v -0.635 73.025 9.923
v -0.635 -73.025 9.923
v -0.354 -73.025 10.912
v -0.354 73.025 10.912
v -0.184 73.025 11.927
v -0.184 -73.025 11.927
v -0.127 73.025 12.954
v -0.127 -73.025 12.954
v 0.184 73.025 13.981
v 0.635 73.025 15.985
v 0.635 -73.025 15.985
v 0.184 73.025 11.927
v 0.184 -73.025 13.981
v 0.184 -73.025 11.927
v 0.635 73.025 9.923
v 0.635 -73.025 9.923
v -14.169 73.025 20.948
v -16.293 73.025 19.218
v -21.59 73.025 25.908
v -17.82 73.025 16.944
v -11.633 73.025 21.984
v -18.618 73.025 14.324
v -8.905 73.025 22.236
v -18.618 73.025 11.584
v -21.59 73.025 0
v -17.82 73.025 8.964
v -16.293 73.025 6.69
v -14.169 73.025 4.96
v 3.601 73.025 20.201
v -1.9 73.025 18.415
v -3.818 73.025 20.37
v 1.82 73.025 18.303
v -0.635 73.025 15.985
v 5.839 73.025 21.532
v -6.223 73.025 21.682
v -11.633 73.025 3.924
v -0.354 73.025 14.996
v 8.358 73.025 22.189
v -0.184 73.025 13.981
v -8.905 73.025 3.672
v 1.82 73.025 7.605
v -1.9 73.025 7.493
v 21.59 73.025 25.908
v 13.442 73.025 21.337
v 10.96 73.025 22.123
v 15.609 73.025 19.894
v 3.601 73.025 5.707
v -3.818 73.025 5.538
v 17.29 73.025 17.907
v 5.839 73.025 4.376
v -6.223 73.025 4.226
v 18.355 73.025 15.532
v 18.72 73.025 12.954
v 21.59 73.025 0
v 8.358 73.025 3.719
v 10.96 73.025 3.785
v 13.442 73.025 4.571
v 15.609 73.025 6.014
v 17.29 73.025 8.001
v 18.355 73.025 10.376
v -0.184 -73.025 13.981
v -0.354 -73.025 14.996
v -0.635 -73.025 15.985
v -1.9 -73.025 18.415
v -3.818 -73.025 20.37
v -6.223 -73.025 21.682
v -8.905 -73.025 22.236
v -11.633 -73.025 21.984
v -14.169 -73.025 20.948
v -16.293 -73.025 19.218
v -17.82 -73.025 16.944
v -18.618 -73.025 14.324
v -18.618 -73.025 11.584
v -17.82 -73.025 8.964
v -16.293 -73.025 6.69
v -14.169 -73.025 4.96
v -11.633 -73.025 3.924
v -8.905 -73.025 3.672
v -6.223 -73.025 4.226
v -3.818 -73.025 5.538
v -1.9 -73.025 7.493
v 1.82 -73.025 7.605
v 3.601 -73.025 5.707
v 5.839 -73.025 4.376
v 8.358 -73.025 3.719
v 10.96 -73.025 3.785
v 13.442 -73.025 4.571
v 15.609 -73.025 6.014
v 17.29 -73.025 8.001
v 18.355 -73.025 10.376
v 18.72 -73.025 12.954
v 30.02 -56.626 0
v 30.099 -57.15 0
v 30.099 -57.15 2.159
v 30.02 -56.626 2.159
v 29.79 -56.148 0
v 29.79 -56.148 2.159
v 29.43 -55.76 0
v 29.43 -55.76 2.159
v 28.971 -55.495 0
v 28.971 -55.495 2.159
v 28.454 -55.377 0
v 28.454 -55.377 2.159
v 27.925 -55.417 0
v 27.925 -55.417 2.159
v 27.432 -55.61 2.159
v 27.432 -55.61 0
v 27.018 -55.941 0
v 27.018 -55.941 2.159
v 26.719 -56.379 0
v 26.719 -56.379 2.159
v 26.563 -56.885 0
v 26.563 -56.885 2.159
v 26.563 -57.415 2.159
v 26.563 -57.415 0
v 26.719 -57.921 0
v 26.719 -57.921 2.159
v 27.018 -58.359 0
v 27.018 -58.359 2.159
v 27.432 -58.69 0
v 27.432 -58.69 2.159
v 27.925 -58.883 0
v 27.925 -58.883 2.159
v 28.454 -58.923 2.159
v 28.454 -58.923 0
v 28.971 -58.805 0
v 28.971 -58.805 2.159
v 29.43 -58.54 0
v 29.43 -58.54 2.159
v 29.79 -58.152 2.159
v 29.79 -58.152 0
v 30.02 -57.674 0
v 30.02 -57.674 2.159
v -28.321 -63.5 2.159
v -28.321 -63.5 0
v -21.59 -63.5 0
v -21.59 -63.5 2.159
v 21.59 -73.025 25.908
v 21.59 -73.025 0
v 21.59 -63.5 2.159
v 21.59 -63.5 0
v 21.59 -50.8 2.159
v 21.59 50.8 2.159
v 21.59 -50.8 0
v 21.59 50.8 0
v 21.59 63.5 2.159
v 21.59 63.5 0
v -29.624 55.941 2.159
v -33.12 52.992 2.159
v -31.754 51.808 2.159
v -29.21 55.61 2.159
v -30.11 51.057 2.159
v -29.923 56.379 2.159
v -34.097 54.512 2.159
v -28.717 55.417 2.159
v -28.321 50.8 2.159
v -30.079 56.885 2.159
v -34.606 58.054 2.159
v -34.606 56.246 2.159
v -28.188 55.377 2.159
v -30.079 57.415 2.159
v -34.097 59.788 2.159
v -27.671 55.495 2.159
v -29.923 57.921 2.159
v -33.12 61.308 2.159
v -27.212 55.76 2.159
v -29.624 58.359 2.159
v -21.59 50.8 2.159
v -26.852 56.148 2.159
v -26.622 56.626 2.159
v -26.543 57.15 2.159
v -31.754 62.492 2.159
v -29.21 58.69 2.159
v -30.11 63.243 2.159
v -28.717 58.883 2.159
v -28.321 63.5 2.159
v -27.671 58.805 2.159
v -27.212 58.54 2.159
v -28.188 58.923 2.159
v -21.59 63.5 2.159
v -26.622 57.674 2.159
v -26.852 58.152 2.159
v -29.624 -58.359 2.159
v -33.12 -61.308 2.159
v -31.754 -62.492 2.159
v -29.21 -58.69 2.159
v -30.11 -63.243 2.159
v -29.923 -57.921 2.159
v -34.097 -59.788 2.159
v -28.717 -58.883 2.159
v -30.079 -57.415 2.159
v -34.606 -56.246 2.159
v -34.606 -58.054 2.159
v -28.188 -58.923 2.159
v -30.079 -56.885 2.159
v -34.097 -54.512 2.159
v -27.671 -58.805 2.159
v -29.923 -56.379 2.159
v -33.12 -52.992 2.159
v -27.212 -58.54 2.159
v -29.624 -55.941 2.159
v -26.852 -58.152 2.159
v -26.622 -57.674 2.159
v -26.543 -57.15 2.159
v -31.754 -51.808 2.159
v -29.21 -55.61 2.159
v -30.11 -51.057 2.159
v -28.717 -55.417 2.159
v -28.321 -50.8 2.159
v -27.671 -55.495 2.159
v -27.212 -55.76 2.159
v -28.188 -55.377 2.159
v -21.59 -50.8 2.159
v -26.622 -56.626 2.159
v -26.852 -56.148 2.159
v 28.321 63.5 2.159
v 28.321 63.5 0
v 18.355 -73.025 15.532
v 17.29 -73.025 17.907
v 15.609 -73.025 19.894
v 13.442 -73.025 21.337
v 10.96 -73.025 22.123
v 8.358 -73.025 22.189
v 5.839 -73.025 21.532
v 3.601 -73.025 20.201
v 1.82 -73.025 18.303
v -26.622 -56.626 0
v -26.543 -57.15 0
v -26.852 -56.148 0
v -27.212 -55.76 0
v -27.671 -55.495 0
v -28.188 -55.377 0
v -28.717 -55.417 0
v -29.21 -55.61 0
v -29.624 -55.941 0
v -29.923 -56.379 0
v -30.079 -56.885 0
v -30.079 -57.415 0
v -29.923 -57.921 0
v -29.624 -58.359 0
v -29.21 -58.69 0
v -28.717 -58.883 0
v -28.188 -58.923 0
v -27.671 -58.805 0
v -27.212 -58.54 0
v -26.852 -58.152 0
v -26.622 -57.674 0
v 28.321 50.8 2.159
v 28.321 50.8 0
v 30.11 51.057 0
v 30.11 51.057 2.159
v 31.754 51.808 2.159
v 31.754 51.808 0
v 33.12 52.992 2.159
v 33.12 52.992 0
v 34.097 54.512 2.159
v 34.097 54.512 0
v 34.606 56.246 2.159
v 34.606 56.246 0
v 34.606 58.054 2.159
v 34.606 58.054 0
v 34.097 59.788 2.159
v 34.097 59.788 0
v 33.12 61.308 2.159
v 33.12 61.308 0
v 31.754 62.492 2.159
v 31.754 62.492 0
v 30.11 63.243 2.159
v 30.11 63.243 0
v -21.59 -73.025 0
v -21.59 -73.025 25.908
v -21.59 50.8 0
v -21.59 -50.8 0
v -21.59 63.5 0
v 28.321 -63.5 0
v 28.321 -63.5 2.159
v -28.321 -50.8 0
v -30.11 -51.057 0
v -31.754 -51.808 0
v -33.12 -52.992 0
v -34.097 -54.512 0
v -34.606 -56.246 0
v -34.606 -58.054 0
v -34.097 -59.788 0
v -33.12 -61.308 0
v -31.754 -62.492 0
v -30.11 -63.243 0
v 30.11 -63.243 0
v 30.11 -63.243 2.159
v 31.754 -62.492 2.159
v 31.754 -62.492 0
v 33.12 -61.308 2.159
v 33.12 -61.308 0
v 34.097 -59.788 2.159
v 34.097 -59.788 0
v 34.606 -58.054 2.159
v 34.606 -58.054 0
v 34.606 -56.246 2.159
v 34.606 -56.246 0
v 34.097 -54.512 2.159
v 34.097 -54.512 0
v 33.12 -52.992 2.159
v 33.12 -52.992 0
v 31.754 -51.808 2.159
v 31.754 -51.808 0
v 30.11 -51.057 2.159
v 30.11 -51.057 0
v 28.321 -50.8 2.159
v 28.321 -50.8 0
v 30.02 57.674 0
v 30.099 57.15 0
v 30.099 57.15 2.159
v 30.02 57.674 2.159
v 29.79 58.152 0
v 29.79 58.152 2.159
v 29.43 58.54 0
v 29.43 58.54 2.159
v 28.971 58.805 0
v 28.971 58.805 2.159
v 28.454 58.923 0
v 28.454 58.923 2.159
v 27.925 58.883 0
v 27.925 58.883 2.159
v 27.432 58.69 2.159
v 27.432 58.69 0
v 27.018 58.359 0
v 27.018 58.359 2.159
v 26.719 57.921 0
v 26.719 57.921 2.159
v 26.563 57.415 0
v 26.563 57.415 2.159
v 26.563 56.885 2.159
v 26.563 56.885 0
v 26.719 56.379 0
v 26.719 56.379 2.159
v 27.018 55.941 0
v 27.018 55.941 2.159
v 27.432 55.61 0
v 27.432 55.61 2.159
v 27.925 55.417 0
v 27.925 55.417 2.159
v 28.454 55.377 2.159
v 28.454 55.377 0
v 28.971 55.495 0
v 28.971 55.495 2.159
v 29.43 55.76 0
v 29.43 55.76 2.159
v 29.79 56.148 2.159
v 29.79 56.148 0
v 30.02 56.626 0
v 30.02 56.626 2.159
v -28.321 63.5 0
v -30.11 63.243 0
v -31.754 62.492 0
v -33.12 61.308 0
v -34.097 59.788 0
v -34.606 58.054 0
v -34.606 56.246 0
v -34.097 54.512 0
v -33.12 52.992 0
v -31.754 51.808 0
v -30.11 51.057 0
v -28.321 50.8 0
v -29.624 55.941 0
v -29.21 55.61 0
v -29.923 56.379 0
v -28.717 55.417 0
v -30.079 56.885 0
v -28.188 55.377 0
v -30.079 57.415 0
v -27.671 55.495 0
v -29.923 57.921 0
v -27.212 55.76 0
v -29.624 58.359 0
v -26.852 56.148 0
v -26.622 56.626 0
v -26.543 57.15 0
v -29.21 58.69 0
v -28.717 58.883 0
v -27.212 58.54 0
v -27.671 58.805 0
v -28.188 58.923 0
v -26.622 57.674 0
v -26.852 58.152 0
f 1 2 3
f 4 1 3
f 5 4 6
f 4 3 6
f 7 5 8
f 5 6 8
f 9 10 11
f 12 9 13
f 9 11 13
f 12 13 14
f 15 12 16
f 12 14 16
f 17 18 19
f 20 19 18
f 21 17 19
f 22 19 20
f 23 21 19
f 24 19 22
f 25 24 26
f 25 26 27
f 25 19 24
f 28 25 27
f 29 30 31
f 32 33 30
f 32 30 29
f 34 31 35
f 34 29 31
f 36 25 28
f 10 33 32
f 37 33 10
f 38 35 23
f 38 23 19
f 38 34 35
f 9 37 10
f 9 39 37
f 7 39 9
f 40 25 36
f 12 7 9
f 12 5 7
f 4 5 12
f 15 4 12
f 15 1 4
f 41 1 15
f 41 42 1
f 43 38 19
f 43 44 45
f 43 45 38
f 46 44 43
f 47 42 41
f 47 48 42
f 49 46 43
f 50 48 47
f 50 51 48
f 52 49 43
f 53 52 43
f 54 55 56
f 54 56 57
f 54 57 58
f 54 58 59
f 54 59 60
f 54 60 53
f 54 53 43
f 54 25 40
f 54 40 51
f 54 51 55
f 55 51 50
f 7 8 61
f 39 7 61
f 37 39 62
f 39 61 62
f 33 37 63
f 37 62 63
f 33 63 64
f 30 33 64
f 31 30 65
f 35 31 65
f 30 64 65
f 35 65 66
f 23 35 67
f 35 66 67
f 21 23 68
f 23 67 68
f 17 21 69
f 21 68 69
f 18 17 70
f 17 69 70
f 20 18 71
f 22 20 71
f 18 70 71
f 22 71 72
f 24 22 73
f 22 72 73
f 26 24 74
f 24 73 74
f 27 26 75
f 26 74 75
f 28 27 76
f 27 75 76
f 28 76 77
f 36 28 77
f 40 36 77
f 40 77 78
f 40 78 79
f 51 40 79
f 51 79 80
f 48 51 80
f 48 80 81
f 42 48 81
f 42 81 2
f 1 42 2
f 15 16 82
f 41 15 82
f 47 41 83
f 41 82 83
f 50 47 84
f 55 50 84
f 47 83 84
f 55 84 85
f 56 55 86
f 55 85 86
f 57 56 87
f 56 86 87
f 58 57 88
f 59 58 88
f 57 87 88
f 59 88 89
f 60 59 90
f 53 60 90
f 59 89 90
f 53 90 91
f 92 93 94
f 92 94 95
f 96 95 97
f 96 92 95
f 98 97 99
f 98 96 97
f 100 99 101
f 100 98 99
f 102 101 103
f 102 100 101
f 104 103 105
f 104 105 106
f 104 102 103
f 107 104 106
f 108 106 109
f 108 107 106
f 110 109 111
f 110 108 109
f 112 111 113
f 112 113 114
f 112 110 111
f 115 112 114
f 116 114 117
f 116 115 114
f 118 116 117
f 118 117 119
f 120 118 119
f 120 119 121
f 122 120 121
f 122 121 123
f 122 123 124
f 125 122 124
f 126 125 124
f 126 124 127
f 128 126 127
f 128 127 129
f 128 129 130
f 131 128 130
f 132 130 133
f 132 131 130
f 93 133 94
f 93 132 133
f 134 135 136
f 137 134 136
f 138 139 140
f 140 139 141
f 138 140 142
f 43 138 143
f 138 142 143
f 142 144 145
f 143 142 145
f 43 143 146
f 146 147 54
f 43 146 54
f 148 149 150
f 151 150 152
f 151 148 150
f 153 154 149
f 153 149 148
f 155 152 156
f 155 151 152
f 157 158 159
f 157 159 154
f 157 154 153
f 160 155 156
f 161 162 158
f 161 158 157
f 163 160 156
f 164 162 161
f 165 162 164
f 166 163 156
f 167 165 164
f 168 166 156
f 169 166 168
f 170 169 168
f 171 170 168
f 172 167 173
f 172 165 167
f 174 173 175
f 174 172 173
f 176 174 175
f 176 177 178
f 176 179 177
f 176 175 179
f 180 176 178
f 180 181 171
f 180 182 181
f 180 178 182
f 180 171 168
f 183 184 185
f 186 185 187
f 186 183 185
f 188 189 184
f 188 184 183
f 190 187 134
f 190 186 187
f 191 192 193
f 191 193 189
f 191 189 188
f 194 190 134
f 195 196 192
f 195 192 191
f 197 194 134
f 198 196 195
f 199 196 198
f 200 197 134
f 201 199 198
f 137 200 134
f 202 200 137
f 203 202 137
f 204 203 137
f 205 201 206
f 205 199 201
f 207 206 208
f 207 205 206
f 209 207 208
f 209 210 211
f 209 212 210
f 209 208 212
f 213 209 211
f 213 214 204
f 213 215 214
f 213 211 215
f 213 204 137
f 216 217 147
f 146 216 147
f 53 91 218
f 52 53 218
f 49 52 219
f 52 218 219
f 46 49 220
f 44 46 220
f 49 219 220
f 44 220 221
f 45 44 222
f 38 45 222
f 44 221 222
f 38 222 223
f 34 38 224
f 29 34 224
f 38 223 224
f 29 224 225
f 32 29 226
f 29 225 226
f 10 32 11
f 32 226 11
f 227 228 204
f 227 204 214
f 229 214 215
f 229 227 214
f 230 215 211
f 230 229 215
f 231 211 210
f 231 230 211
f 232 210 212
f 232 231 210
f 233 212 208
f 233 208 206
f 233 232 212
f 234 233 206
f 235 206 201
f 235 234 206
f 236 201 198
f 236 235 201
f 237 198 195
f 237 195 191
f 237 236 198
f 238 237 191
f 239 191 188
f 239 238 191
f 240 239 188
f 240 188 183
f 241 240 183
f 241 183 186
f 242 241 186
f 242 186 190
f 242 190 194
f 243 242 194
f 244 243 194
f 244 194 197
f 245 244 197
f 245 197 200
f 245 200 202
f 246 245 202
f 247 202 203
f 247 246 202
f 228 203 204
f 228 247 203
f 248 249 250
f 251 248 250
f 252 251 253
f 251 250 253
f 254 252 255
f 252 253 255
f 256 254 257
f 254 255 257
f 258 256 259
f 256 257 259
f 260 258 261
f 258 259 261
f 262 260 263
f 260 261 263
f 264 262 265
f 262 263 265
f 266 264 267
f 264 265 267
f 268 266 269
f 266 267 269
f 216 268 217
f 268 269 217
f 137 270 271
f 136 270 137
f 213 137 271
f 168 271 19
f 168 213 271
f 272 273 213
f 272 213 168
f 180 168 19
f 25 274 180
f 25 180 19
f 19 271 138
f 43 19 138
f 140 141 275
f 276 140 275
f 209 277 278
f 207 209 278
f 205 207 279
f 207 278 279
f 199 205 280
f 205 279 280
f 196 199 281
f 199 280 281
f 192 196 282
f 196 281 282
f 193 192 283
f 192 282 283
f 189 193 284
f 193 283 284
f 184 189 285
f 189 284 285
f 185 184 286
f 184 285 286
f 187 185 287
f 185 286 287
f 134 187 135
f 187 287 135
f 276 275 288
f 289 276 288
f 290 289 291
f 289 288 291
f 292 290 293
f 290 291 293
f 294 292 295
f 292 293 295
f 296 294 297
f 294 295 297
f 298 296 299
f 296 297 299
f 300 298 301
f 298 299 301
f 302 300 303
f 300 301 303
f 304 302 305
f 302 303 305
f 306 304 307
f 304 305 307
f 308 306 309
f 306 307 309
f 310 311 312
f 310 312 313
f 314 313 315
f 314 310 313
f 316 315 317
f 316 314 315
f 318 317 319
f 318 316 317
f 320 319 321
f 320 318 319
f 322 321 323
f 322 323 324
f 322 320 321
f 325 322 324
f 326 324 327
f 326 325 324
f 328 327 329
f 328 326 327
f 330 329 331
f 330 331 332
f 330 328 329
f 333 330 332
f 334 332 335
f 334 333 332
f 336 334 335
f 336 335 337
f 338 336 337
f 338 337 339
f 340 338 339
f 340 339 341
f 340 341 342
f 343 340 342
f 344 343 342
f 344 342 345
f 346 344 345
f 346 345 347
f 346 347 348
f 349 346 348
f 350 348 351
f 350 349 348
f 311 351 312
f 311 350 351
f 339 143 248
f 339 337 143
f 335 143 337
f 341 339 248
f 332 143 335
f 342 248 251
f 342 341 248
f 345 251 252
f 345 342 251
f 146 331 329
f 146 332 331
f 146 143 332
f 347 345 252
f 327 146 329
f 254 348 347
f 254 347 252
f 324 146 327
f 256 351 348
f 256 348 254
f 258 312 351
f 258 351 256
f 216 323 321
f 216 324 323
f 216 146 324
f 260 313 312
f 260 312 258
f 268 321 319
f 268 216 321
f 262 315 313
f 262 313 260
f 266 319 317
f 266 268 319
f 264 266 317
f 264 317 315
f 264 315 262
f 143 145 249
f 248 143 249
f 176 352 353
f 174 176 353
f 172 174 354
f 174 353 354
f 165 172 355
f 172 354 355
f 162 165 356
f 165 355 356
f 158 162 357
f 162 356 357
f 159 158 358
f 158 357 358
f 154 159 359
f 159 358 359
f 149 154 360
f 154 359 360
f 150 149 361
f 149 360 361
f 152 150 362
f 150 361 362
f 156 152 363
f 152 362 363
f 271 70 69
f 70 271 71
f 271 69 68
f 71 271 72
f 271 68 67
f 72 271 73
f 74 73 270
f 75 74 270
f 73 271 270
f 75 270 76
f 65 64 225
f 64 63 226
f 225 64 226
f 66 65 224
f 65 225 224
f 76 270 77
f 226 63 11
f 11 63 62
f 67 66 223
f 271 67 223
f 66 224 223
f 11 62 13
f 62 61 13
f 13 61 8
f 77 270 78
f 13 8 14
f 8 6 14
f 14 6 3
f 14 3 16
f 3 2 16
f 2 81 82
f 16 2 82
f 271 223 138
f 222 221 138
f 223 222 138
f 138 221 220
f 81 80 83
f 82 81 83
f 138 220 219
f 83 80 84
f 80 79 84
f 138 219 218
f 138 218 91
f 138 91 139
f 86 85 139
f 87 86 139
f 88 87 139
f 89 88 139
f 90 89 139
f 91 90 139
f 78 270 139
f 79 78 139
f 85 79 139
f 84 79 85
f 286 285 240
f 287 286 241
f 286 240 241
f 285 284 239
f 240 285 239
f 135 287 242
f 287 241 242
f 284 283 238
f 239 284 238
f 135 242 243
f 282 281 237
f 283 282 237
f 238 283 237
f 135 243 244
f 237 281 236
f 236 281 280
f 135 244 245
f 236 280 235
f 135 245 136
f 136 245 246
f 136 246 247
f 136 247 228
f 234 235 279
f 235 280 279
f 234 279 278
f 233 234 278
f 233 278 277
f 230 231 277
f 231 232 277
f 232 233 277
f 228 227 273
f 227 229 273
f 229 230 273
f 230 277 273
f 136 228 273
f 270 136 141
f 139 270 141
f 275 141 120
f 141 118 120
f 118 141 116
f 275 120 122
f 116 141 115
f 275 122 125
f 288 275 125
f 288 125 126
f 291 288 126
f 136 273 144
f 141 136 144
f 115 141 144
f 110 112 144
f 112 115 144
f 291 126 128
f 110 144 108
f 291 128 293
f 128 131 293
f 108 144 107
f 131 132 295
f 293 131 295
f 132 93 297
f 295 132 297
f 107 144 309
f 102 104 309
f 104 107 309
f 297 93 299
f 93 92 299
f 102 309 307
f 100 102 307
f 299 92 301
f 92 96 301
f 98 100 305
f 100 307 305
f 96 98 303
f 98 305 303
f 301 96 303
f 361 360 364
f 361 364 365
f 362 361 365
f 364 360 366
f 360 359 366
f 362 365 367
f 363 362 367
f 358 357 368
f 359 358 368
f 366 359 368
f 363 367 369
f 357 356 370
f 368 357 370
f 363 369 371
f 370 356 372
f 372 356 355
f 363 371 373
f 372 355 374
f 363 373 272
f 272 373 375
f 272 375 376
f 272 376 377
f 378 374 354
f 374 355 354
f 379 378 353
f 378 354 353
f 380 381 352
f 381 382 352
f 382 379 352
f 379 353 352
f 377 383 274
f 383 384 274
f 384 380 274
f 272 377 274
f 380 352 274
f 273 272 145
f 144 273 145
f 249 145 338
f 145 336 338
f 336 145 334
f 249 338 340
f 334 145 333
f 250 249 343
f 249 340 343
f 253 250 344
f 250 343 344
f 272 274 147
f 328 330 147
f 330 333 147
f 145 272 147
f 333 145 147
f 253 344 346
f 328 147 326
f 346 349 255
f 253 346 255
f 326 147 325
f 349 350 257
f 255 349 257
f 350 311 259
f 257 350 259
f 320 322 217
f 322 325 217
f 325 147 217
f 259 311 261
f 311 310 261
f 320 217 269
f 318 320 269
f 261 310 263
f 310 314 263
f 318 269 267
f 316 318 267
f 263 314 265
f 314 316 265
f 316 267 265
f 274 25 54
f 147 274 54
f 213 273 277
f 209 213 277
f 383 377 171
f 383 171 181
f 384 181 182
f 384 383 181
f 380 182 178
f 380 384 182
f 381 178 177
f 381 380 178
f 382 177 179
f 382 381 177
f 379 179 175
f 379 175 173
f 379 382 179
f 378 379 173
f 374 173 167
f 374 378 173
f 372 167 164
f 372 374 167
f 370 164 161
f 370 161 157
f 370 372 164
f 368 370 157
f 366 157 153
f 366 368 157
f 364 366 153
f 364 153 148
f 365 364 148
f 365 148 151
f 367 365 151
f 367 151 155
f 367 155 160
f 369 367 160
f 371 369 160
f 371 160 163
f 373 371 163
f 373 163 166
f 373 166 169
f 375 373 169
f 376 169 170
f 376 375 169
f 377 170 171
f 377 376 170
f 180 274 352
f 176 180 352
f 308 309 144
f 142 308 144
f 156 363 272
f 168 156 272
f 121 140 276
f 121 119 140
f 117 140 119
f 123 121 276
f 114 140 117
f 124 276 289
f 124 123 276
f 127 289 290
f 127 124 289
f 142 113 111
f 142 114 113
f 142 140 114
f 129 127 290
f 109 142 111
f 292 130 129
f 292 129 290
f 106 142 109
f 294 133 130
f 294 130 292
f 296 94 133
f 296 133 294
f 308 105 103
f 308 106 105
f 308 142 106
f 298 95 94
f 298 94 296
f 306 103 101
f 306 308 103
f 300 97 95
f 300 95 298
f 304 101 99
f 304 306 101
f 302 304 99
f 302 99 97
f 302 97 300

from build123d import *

# Parameters (mm, degrees)
F0_R     = 1.778
F1_DEPTH = 2.159
F2_W     = 43.18
F2_H     = 146.05
F3_DEPTH = 21.59
F4_W     = 43.18
F4_H     = 146.05
F5_DEPTH = 2.159
F7_DEPTH = 146.051


with BuildPart() as f1:
    # F0 (on Top) → F1 (new body)
    with BuildSketch(Plane.XY):
        Polygon((21.59, 63.5), (21.59, 73.025), (-21.59, 73.025), (-21.59, 63.5), (-21.59, 50.8), (-21.59, -50.8), (-21.59, -63.5), (-21.59, -73.025), (21.59, -73.025), (21.59, -63.5), (21.59, -50.8), (21.59, 50.8), align=None)
        with BuildLine():
            Line((28.321, 63.5), (21.59, 63.5))
            Line((21.59, 63.5), (21.59, 50.8))
            Line((21.59, 50.8), (28.321, 50.8))
            ThreePointArc((28.321, 50.8), (34.671, 57.15), (28.321, 63.5))
        make_face()
        with Locations((28.321, 57.15)):
            Circle(F0_R, mode=Mode.SUBTRACT)
        with BuildLine():
            Line((-21.59, 50.8), (-21.59, 63.5))
            Line((-21.59, 63.5), (-28.321, 63.5))
            ThreePointArc((-28.321, 63.5), (-34.671, 57.15), (-28.321, 50.8))
            Line((-28.321, 50.8), (-21.59, 50.8))
        make_face()
        with Locations((-28.321, 57.15)):
            Circle(F0_R, mode=Mode.SUBTRACT)
        with BuildLine():
            Line((28.321, -50.8), (21.59, -50.8))
            Line((21.59, -50.8), (21.59, -63.5))
            Line((21.59, -63.5), (28.321, -63.5))
            ThreePointArc((28.321, -63.5), (34.671, -57.15), (28.321, -50.8))
        make_face()
        with Locations((28.321, -57.15)):
            Circle(F0_R, mode=Mode.SUBTRACT)
        with BuildLine():
            Line((-21.59, -63.5), (-21.59, -50.8))
            Line((-21.59, -50.8), (-28.321, -50.8))
            ThreePointArc((-28.321, -50.8), (-34.671, -57.15), (-28.321, -63.5))
            Line((-28.321, -63.5), (-21.59, -63.5))
        make_face()
        with Locations((-28.321, -57.15)):
            Circle(F0_R, mode=Mode.SUBTRACT)
    extrude(amount=F1_DEPTH)

    # F2 (on face) → F3 (join)
    with BuildSketch(Plane.XY.offset(2.159)):
        Rectangle(F2_W, F2_H)
    extrude(amount=F3_DEPTH)

    # F4 (on face) → F5 (join)
    with BuildSketch(Plane.XY.offset(23.749)):
        Rectangle(F4_W, F4_H)
    extrude(amount=F5_DEPTH)

    # F6 (on face) → F7 (cut, through all)
    with BuildSketch(Plane.XZ.offset(73.025)):
        with BuildLine():
            Line((-0.635, 9.922981), (-0.635, 15.985019))
            ThreePointArc((-0.635, 15.985019), (-18.7198, 12.954), (-0.635, 9.922981))
        make_face()
        with BuildLine():
            ThreePointArc((-0.635, 9.922981), (-0.25488, 11.417352), (-0.127, 12.954))
            ThreePointArc((-0.127, 12.954), (-0.25488, 14.490648), (-0.635, 15.985019))
            Line((-0.635, 15.985019), (-0.635, 9.922981))
        make_face()
        with BuildLine():
            Line((0.635, 9.922981), (0.635, 15.985019))
            ThreePointArc((0.635, 15.985019), (0.127, 12.954), (0.635, 9.922981))
        make_face()
        with BuildLine():
            ThreePointArc((18.7198, 12.954), (10.960048, 22.12252), (0.635, 15.985019))
            Line((0.635, 15.985019), (0.635, 9.922981))
            ThreePointArc((0.635, 9.922981), (10.960048, 3.78548), (18.7198, 12.954))
        make_face()
    extrude(amount=-F7_DEPTH, mode=Mode.SUBTRACT)


solid = f1.part
